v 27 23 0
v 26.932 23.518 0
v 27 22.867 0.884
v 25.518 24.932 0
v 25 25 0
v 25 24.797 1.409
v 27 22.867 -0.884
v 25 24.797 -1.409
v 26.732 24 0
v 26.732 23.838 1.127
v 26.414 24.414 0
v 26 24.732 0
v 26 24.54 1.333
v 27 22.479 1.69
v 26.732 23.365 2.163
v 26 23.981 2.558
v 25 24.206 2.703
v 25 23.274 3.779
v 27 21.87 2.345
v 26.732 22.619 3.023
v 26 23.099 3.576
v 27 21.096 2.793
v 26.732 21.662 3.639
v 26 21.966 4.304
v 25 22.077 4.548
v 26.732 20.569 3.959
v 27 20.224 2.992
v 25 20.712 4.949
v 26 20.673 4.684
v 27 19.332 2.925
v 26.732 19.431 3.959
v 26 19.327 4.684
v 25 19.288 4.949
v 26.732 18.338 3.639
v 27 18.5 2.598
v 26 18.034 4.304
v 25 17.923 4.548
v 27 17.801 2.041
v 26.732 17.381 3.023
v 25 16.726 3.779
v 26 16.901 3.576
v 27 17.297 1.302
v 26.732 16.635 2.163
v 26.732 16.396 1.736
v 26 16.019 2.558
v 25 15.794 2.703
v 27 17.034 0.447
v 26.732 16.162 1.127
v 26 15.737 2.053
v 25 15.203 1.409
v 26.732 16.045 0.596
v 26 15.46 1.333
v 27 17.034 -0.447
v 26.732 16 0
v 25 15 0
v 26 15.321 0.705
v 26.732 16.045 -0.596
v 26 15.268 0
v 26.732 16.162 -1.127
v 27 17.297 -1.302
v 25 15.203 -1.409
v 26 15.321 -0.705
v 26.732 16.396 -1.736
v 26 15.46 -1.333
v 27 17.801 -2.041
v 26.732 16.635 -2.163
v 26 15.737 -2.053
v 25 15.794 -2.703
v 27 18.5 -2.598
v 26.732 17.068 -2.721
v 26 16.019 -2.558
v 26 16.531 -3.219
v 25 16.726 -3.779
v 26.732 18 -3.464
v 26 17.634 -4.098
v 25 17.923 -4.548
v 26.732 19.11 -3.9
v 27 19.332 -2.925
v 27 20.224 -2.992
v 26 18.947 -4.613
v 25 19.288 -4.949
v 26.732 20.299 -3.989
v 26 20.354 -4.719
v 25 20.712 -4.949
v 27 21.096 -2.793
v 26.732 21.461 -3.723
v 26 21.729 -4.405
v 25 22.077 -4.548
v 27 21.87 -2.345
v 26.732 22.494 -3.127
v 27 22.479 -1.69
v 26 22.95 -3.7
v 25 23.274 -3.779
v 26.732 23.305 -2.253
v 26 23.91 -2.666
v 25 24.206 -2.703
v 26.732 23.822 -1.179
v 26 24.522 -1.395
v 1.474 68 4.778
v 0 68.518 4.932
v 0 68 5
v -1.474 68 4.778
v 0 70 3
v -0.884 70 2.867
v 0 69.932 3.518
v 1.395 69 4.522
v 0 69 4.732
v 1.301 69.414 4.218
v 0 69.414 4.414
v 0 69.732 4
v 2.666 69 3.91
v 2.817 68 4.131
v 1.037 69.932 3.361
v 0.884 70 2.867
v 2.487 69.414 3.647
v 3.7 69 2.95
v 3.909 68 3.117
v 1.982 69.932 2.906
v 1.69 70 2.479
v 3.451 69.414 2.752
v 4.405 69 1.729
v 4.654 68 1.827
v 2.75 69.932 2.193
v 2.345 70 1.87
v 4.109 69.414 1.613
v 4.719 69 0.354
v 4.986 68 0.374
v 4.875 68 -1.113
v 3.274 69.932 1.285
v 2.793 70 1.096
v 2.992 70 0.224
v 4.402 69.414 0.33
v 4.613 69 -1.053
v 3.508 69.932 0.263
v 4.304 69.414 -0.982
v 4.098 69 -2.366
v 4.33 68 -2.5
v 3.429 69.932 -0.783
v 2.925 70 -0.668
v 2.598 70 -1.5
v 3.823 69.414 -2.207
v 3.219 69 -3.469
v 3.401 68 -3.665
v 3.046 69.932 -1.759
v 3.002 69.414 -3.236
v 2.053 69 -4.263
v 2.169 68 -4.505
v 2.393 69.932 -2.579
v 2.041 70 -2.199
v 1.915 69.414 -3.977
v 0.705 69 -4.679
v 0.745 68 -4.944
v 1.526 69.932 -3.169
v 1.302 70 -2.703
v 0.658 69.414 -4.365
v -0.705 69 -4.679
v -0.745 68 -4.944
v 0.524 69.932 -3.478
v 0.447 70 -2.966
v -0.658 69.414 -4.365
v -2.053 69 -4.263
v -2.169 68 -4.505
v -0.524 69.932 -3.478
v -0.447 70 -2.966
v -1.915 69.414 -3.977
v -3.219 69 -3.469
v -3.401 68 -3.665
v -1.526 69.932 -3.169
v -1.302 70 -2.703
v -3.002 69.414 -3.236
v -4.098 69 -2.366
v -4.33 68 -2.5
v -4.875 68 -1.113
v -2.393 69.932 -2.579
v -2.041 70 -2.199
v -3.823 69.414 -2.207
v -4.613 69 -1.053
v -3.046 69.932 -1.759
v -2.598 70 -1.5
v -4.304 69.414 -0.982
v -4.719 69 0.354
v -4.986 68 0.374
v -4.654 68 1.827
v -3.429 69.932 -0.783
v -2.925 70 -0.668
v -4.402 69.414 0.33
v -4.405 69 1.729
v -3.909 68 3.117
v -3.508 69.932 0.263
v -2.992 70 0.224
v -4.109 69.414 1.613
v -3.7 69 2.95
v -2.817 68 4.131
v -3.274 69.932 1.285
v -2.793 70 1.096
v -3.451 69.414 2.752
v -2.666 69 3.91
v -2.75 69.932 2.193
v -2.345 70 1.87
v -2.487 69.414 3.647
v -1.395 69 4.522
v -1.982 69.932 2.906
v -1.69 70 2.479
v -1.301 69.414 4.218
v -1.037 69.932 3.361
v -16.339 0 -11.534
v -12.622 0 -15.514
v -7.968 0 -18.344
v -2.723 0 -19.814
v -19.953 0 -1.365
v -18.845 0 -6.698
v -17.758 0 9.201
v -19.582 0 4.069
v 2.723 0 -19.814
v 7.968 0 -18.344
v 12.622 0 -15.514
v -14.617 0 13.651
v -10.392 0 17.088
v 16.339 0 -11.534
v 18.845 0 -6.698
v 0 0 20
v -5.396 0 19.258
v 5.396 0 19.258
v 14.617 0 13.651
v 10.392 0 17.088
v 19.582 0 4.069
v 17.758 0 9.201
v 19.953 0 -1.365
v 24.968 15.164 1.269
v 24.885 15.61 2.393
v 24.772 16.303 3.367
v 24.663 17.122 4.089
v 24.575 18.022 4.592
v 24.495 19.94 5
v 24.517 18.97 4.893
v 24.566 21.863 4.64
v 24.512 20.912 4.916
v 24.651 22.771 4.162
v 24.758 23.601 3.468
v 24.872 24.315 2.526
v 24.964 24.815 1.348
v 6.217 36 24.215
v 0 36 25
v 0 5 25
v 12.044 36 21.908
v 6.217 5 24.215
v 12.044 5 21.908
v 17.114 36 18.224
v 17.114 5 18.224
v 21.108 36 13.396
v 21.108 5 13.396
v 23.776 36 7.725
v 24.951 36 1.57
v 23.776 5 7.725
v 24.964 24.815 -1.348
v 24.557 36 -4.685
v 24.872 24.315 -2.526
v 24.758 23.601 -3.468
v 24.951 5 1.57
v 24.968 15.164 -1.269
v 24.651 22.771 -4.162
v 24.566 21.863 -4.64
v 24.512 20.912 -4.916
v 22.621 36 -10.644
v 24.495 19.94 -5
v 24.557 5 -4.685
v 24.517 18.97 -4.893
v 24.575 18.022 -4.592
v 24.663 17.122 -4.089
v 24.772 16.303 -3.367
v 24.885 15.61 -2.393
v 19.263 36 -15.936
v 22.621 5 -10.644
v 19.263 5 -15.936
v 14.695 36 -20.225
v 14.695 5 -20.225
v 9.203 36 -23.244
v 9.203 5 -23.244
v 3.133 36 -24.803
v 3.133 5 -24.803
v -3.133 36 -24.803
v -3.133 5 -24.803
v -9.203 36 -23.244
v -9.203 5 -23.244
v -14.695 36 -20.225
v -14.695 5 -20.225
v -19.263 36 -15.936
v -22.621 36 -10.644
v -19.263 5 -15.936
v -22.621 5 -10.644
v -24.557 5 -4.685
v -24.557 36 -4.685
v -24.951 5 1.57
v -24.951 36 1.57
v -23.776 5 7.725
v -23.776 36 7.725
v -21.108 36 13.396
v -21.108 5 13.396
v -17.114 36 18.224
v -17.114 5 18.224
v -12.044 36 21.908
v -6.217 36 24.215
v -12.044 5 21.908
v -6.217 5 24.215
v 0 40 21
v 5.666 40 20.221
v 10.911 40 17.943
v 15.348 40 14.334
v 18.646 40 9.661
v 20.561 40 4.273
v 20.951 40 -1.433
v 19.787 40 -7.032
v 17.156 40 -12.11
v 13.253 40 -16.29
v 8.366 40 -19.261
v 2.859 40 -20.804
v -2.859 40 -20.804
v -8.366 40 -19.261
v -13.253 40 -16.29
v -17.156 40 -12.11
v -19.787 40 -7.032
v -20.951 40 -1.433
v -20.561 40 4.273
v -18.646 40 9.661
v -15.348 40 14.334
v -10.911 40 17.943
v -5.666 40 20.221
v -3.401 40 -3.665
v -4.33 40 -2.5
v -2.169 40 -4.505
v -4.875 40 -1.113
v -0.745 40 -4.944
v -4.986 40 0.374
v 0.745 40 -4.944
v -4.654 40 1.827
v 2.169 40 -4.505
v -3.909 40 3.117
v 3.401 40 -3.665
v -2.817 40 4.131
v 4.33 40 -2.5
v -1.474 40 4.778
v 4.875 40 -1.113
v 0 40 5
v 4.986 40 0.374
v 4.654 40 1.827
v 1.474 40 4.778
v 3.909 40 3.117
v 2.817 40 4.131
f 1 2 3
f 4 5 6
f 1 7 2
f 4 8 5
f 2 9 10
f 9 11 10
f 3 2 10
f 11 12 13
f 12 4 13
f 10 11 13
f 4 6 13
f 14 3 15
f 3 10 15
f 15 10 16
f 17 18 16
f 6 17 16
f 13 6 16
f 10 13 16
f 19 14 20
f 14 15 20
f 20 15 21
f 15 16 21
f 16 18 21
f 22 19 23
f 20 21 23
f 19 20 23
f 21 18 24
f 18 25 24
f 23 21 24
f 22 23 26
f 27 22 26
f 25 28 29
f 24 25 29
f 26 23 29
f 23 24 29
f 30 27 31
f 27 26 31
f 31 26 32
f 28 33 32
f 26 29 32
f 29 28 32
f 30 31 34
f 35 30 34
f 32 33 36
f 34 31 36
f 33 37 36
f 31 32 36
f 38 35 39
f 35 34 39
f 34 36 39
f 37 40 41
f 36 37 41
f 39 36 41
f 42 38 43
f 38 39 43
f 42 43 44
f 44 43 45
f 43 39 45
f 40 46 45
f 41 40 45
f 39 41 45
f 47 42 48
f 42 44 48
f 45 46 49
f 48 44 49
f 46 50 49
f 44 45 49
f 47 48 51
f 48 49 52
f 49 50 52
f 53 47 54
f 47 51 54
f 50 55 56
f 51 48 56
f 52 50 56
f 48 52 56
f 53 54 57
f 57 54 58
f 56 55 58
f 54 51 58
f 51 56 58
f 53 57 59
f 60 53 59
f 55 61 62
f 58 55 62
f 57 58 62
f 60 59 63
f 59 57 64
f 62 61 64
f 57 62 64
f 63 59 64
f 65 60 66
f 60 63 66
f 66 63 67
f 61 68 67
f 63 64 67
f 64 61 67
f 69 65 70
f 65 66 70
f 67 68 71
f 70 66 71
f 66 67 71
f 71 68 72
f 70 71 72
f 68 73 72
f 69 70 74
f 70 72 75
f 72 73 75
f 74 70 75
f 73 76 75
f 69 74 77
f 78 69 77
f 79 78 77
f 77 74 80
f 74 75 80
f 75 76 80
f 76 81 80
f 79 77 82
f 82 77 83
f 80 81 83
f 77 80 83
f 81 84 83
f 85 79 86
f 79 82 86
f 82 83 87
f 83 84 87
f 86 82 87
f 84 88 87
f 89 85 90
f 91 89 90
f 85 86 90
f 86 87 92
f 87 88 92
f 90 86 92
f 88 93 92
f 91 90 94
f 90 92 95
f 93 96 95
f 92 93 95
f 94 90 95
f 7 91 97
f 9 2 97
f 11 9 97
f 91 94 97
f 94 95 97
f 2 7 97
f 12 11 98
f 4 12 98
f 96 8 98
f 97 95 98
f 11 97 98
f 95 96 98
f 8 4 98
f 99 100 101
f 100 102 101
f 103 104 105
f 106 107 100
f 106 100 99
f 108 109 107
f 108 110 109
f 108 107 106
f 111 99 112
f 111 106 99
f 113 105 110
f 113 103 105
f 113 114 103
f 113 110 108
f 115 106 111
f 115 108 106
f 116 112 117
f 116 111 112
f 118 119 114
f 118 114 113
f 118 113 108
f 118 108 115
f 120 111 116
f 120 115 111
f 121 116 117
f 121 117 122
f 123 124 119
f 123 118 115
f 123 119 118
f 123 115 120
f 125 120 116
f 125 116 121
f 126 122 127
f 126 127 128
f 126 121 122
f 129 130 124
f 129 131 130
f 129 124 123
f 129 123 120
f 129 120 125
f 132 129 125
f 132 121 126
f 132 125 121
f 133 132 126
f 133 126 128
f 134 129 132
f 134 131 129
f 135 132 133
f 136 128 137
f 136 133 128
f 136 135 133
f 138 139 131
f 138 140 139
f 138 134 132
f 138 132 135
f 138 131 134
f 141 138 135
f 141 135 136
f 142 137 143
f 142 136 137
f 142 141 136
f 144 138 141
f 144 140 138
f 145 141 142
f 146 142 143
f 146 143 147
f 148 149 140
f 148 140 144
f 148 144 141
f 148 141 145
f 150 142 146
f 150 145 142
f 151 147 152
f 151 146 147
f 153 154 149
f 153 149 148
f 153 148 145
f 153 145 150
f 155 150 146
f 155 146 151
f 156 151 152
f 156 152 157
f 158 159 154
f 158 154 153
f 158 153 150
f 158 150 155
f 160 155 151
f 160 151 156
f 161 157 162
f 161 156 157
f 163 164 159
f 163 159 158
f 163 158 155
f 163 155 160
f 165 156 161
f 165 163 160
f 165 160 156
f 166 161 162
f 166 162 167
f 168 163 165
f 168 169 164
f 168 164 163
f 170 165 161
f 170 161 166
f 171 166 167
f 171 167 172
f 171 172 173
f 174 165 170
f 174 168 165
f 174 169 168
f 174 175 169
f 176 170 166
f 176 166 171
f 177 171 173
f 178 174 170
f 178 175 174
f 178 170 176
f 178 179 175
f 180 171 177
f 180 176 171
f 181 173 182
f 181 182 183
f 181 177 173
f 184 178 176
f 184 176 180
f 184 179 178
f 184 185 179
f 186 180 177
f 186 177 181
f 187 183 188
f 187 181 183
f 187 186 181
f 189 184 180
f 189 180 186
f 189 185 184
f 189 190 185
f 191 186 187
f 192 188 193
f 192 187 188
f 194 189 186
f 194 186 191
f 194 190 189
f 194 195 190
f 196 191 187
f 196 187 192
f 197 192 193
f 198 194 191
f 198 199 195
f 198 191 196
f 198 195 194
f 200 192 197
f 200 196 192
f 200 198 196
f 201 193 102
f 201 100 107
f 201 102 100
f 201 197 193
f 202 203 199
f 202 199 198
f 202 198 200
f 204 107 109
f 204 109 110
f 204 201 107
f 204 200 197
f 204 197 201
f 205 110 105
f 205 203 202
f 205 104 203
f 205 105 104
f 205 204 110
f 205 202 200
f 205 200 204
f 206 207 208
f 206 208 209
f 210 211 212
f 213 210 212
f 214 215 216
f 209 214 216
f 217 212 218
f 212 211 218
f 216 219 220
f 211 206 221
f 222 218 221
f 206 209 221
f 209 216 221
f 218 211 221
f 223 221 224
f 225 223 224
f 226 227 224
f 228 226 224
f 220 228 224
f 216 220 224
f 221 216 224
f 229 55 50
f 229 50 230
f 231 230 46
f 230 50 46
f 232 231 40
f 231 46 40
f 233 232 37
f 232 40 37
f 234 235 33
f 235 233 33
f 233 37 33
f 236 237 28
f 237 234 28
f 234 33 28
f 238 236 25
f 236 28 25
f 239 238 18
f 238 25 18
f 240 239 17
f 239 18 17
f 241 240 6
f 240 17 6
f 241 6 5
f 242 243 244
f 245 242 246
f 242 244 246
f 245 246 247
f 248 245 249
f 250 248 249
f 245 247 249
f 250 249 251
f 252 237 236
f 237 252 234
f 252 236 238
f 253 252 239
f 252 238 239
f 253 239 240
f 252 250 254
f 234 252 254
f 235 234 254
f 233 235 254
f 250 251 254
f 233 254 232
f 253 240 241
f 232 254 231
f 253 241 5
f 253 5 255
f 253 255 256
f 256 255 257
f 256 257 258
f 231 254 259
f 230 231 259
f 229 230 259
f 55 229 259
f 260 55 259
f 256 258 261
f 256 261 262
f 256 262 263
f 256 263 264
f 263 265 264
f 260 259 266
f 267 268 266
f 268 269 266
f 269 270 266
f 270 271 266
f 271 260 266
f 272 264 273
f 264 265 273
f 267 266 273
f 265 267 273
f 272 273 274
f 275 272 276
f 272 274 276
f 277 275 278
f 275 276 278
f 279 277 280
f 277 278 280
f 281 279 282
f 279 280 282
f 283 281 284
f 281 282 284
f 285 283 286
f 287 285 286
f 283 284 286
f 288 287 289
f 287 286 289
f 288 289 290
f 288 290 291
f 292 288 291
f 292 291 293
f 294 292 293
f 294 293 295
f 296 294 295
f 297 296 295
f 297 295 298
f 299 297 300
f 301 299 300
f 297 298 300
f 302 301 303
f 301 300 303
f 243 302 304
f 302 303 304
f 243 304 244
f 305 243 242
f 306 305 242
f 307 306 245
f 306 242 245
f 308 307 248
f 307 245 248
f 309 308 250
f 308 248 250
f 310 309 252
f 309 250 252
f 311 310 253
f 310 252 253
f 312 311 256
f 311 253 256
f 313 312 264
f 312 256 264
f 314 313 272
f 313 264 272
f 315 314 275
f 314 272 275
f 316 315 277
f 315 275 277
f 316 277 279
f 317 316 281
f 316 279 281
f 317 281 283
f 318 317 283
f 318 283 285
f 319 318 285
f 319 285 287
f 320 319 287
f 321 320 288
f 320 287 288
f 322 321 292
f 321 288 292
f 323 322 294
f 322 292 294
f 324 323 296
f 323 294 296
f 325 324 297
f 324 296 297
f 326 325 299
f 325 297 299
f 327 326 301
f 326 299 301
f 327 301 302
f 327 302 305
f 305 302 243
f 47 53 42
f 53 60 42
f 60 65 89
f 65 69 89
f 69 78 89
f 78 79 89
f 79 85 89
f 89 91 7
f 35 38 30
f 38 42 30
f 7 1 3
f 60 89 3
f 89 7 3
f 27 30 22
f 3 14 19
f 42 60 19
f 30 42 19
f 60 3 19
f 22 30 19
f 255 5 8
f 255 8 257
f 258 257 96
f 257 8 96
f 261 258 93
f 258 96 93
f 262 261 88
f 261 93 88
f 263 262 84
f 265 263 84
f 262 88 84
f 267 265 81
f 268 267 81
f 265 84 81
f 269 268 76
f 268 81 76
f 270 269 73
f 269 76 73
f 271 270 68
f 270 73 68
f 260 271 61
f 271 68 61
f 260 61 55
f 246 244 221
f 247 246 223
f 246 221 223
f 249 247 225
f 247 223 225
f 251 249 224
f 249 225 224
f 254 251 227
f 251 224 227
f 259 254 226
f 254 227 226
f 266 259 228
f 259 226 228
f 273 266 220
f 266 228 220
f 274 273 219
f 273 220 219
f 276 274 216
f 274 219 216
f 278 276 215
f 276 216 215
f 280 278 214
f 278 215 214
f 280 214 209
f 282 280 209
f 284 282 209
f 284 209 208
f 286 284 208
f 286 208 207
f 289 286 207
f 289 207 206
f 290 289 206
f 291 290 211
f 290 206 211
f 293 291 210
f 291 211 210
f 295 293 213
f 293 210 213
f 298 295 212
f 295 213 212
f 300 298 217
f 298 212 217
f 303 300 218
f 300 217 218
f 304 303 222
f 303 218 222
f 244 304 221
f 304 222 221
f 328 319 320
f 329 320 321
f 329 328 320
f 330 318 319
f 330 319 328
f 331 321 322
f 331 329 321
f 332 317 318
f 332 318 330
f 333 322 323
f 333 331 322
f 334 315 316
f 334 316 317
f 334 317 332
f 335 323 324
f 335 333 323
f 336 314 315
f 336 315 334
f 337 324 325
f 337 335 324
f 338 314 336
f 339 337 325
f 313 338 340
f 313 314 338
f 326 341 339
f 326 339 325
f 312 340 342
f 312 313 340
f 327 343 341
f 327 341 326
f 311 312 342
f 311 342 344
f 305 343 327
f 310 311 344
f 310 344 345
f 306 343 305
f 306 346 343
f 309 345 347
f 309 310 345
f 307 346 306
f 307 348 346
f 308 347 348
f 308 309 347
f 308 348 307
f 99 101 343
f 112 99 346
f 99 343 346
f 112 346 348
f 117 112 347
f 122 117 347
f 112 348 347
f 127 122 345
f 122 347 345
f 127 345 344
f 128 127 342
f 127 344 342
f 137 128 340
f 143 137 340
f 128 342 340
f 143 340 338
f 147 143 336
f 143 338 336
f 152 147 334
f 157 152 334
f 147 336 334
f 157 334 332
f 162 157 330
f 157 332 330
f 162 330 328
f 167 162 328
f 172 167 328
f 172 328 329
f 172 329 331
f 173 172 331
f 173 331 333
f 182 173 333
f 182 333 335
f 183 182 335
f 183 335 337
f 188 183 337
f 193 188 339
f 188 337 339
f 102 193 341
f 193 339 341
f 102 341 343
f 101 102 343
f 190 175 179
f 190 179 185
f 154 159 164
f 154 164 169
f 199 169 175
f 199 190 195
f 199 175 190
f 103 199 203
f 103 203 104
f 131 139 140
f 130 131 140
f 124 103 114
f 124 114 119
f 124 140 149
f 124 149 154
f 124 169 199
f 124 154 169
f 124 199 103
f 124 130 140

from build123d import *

# Parameters (mm, degrees)
CROQUIS1_R                   = 25
SALIENTE_EXTRUIR1_DEPTH      = 40
CROQUIS2_R                   = 5
SALIENTE_EXTRUIR2_DEPTH      = 30
REDONDEO1_R                  = 2
CHAFL_N1_SIZE                = 4
SALIENTE_EXTRUIR3_DEPTH      = 2
SALIENTE_EXTRUIR3_DEPTH_BACK = 2
CROQUIS3_R                   = 5
CHAFL_N2_SIZE                = 5


with BuildPart() as part:
    # Croquis1 → Saliente-Extruir1 (new body)
    with BuildSketch(Plane(origin=(0, 0, 0), x_dir=(1, 0, 0), z_dir=(0, 1, 0))):
        with Locations(Location((0, 0, 0), (0, 0, 270))):
            Circle(CROQUIS1_R)
    extrude(amount=SALIENTE_EXTRUIR1_DEPTH)

    # Croquis2 → Saliente-Extruir2 (add)
    with BuildSketch(Plane(origin=(0, 40, 0), x_dir=(1, 0, 0), z_dir=(0, 1, 0))):
        with Locations(Location((0, 0, 0), (0, 0, 270))):
            Circle(CROQUIS2_R)
    extrude(amount=SALIENTE_EXTRUIR2_DEPTH)

    # Redondeo1
    redondeo1_edges = [part.edges().sort_by_distance(p)[0] for p in [
        (0, 70, -5),
    ]]
    fillet(redondeo1_edges, radius=REDONDEO1_R)

    # Chaflán1
    chafl_n1_edges = [part.edges().sort_by_distance(p)[0] for p in [
        (0, 40, -25),
    ]]
    chamfer(chafl_n1_edges, length=CHAFL_N1_SIZE)

    # Croquis3 → Saliente-Extruir3 (add, two sides: drawn at the far end of the back side and taken through both)
    with BuildSketch(Plane.ZY.offset(-25).offset(-SALIENTE_EXTRUIR3_DEPTH_BACK)):
        with Locations((0, 20)):
            Circle(CROQUIS3_R)
    extrude(amount=SALIENTE_EXTRUIR3_DEPTH + SALIENTE_EXTRUIR3_DEPTH_BACK)

    # Redondeo3: read off the stored shape, not the designer's step
    # Redondeo3 outline → Redondeo3 (revolve, cut)
    with BuildSketch(Plane(origin=(0, 20, 0), x_dir=(0, 1, 0), z_dir=(0, 0, -1))):
        with BuildLine():
            Line((5, 27), (3, 27))
            ThreePointArc((3, 27), (4.414213562, 26.414213562), (5, 25))
            Line((5, 25), (5, 27))
        make_face()
    revolve(axis=Axis((0, 20, 0), (1, 0, 0)), mode=Mode.SUBTRACT)

    # Chaflán2
    chafl_n2_edges = [part.edges().sort_by_distance(p)[0] for p in [
        (0, 0, -25),
    ]]
    chamfer(chafl_n2_edges, length=CHAFL_N2_SIZE)


solid = part.part
